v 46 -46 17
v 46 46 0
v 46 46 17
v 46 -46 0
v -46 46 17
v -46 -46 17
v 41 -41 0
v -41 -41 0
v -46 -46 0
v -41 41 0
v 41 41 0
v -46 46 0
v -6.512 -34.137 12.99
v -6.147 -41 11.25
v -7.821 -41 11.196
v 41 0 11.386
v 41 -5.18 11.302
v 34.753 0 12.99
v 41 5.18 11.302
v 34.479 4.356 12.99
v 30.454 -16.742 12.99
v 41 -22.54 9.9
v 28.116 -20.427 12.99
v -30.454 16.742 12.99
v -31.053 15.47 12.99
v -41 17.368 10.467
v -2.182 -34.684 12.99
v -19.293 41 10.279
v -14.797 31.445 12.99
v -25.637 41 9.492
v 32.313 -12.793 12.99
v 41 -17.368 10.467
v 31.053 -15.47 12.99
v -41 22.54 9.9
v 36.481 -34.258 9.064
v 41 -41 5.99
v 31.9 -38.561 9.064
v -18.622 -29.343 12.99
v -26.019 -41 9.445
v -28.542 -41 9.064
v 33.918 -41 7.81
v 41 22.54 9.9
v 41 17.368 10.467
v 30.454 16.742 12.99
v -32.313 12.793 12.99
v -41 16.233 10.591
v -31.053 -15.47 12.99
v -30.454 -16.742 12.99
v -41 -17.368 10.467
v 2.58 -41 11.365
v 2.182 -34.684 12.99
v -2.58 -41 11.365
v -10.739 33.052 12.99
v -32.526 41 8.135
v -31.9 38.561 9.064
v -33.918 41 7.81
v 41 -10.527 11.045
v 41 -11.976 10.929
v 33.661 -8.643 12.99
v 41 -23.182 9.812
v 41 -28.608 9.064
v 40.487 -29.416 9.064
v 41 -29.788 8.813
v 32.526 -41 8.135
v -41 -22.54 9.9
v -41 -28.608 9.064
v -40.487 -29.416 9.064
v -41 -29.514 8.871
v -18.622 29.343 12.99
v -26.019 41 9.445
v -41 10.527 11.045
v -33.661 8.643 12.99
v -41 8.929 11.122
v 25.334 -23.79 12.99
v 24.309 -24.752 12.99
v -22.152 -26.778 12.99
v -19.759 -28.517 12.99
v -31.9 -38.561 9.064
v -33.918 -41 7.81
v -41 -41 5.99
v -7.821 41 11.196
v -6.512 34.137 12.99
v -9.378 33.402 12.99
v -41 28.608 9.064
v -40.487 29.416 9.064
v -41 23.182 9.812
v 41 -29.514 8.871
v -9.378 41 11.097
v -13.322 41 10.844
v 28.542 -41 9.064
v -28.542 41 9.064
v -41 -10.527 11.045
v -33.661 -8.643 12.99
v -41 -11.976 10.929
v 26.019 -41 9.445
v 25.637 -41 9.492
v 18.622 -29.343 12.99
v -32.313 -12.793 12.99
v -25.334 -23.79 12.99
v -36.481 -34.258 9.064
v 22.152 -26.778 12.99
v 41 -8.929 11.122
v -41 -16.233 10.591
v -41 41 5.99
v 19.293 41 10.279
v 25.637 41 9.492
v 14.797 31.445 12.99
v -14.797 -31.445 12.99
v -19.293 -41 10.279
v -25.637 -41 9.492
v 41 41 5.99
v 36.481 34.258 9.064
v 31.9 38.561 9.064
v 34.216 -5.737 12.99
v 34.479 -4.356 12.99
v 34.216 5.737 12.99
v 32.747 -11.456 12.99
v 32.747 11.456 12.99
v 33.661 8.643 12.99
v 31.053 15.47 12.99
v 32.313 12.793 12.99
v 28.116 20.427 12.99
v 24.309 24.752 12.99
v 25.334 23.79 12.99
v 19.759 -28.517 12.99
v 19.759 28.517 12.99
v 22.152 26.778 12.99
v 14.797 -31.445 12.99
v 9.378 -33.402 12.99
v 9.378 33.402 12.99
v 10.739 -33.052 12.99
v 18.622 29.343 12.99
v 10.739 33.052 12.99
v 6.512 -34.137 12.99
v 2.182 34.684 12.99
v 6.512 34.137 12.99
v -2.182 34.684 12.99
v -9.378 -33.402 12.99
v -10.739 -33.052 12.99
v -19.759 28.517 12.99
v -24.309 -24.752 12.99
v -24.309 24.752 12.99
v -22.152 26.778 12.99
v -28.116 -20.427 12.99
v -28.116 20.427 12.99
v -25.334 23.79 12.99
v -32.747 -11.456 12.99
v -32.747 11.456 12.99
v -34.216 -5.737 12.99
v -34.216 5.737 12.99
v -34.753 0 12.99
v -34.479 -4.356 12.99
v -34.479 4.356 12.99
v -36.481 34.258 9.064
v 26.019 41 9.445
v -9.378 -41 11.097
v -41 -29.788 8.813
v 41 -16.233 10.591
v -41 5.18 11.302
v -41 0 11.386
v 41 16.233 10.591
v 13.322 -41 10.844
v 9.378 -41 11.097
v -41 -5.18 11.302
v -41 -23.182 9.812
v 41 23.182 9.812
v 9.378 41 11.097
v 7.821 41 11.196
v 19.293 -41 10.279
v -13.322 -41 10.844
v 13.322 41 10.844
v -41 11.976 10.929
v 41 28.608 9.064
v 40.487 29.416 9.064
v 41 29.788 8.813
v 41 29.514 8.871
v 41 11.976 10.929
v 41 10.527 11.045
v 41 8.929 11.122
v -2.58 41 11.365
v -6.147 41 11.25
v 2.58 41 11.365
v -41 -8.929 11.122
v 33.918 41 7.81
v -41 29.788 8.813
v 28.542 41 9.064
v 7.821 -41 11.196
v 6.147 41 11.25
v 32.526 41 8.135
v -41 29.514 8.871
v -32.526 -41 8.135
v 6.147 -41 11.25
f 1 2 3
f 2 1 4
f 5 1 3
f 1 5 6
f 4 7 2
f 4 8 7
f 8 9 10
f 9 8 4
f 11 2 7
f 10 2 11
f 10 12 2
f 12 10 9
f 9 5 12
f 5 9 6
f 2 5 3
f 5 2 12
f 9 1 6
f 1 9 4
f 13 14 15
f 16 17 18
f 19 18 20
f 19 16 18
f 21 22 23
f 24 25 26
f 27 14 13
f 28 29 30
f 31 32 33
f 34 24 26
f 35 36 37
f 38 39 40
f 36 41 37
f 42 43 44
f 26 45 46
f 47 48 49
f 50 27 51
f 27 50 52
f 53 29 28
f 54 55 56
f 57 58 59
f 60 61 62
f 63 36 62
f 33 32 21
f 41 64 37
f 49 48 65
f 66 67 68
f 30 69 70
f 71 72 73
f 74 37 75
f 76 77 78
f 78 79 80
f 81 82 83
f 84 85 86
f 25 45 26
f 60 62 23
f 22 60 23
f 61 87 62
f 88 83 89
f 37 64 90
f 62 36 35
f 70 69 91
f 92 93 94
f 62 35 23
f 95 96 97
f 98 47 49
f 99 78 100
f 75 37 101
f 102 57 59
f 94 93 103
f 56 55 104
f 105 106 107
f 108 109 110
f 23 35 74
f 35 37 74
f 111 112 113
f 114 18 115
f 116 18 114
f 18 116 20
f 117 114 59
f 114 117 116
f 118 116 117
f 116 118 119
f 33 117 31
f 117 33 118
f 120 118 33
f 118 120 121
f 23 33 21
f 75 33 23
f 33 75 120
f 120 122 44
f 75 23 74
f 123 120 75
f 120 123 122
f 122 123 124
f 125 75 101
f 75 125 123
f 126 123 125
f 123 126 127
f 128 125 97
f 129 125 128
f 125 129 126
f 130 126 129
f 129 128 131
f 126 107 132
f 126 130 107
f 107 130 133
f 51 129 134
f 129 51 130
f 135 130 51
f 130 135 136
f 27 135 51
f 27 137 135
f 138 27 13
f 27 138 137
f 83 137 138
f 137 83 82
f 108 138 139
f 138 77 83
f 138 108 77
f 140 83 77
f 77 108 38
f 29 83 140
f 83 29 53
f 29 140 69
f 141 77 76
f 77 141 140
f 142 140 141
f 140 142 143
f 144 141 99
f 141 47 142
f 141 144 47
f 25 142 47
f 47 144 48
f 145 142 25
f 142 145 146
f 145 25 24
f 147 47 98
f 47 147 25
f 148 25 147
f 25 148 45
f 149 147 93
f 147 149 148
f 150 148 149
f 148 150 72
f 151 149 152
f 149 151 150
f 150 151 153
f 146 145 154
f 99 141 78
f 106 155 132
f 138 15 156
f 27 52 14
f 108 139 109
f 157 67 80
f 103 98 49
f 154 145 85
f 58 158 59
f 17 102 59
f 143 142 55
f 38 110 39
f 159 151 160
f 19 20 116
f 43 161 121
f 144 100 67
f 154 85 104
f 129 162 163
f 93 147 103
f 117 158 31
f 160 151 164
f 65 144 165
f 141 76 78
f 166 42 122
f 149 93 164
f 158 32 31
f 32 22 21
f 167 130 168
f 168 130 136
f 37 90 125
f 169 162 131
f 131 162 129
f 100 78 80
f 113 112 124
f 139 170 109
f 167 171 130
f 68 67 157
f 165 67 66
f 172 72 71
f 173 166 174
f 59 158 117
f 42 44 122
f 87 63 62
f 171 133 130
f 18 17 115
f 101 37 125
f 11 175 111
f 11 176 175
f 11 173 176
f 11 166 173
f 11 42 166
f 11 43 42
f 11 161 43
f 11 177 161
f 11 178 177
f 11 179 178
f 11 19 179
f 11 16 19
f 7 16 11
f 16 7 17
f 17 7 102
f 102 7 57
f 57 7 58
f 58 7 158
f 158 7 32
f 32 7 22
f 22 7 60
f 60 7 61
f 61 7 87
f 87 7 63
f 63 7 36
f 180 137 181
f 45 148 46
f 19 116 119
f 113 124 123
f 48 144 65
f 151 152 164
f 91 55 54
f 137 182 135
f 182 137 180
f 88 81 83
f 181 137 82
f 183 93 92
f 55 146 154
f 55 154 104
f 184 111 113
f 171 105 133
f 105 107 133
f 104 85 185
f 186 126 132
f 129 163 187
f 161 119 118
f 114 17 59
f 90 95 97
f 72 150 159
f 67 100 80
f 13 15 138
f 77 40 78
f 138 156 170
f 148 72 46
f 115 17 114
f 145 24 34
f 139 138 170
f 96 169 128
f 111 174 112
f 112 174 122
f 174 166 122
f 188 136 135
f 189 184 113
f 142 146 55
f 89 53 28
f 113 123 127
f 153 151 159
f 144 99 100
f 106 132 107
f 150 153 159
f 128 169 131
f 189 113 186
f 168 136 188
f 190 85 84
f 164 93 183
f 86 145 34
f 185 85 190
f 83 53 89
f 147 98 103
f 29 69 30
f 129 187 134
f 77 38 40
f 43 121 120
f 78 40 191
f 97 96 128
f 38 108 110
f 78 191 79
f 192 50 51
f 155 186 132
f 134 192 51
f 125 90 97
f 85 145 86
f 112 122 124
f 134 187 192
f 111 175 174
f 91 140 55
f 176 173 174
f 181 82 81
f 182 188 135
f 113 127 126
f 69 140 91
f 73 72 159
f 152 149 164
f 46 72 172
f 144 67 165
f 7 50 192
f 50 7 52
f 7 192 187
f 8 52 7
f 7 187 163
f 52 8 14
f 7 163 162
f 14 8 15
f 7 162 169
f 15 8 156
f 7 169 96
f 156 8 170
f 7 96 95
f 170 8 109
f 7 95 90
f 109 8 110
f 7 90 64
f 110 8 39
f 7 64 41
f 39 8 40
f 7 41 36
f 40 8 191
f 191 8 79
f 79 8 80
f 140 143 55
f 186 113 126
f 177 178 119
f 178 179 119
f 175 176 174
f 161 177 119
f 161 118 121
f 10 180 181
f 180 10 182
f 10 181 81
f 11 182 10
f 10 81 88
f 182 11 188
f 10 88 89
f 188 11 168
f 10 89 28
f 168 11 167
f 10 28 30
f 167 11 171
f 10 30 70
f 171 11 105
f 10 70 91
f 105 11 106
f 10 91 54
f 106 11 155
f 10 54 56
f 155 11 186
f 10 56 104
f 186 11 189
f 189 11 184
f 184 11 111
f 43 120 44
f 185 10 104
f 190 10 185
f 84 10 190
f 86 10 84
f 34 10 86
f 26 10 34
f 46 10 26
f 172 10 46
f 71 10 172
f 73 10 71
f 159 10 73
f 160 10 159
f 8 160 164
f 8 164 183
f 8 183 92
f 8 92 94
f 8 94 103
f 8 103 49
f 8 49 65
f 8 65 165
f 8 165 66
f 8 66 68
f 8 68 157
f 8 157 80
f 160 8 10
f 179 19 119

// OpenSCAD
capInnerWidth=92;
capInnerDepth=17;

postOuterWidth=82;
postCurveHeight=11;
postCurveFlatCutHeight=4;

overlap=0.01;
$fn=50;

difference() {
    gapFillerBody();
    translate([0,0,-overlap])
        //scale([1,1,1.4])
        postTopCutout();
}

module gapFillerBody() {
    translate([-capInnerWidth/2,-capInnerWidth/2,0])
        cube([capInnerWidth, capInnerWidth, capInnerDepth]);
}

module postTopCutout() {
    curveMultiplier=3.95;
    curveSphereDia=postOuterWidth*curveMultiplier;
    hull() {
        // square part
        translate([-postOuterWidth/2, -postOuterWidth/2,0])
            cube([postOuterWidth,postOuterWidth,capInnerDepth-postCurveHeight]);
        
        // domed part
        difference() {
            translate([0,0,capInnerDepth-postCurveHeight])
                difference() {
                   translate([0,0,-curveSphereDia/2+postCurveHeight])
                        sphere(d=curveSphereDia);
                    // bottom cut
                    translate([-curveSphereDia/2-overlap,-curveSphereDia/2-overlap,-curveSphereDia]) 
                        cube([curveSphereDia+overlap*2,
                            curveSphereDia+overlap*2,
                            curveSphereDia+overlap]);
                    translate([-curveSphereDia/2-overlap,
                            -curveSphereDia/2-overlap,
                            postCurveHeight-postCurveFlatCutHeight]) 
                        cube([curveSphereDia+overlap*2,
                            curveSphereDia+overlap*2,
                            curveSphereDia+overlap]);
                
            }
            // square off outer square
            translate([-postOuterWidth,-postOuterWidth,0])
                difference() {
                    cube([postOuterWidth*2,postOuterWidth*2,capInnerDepth]);
                    translate([postOuterWidth/2,postOuterWidth/2,-overlap])
                    cube([postOuterWidth,postOuterWidth,capInnerDepth+overlap*2]);
                }
        }
    }
}
